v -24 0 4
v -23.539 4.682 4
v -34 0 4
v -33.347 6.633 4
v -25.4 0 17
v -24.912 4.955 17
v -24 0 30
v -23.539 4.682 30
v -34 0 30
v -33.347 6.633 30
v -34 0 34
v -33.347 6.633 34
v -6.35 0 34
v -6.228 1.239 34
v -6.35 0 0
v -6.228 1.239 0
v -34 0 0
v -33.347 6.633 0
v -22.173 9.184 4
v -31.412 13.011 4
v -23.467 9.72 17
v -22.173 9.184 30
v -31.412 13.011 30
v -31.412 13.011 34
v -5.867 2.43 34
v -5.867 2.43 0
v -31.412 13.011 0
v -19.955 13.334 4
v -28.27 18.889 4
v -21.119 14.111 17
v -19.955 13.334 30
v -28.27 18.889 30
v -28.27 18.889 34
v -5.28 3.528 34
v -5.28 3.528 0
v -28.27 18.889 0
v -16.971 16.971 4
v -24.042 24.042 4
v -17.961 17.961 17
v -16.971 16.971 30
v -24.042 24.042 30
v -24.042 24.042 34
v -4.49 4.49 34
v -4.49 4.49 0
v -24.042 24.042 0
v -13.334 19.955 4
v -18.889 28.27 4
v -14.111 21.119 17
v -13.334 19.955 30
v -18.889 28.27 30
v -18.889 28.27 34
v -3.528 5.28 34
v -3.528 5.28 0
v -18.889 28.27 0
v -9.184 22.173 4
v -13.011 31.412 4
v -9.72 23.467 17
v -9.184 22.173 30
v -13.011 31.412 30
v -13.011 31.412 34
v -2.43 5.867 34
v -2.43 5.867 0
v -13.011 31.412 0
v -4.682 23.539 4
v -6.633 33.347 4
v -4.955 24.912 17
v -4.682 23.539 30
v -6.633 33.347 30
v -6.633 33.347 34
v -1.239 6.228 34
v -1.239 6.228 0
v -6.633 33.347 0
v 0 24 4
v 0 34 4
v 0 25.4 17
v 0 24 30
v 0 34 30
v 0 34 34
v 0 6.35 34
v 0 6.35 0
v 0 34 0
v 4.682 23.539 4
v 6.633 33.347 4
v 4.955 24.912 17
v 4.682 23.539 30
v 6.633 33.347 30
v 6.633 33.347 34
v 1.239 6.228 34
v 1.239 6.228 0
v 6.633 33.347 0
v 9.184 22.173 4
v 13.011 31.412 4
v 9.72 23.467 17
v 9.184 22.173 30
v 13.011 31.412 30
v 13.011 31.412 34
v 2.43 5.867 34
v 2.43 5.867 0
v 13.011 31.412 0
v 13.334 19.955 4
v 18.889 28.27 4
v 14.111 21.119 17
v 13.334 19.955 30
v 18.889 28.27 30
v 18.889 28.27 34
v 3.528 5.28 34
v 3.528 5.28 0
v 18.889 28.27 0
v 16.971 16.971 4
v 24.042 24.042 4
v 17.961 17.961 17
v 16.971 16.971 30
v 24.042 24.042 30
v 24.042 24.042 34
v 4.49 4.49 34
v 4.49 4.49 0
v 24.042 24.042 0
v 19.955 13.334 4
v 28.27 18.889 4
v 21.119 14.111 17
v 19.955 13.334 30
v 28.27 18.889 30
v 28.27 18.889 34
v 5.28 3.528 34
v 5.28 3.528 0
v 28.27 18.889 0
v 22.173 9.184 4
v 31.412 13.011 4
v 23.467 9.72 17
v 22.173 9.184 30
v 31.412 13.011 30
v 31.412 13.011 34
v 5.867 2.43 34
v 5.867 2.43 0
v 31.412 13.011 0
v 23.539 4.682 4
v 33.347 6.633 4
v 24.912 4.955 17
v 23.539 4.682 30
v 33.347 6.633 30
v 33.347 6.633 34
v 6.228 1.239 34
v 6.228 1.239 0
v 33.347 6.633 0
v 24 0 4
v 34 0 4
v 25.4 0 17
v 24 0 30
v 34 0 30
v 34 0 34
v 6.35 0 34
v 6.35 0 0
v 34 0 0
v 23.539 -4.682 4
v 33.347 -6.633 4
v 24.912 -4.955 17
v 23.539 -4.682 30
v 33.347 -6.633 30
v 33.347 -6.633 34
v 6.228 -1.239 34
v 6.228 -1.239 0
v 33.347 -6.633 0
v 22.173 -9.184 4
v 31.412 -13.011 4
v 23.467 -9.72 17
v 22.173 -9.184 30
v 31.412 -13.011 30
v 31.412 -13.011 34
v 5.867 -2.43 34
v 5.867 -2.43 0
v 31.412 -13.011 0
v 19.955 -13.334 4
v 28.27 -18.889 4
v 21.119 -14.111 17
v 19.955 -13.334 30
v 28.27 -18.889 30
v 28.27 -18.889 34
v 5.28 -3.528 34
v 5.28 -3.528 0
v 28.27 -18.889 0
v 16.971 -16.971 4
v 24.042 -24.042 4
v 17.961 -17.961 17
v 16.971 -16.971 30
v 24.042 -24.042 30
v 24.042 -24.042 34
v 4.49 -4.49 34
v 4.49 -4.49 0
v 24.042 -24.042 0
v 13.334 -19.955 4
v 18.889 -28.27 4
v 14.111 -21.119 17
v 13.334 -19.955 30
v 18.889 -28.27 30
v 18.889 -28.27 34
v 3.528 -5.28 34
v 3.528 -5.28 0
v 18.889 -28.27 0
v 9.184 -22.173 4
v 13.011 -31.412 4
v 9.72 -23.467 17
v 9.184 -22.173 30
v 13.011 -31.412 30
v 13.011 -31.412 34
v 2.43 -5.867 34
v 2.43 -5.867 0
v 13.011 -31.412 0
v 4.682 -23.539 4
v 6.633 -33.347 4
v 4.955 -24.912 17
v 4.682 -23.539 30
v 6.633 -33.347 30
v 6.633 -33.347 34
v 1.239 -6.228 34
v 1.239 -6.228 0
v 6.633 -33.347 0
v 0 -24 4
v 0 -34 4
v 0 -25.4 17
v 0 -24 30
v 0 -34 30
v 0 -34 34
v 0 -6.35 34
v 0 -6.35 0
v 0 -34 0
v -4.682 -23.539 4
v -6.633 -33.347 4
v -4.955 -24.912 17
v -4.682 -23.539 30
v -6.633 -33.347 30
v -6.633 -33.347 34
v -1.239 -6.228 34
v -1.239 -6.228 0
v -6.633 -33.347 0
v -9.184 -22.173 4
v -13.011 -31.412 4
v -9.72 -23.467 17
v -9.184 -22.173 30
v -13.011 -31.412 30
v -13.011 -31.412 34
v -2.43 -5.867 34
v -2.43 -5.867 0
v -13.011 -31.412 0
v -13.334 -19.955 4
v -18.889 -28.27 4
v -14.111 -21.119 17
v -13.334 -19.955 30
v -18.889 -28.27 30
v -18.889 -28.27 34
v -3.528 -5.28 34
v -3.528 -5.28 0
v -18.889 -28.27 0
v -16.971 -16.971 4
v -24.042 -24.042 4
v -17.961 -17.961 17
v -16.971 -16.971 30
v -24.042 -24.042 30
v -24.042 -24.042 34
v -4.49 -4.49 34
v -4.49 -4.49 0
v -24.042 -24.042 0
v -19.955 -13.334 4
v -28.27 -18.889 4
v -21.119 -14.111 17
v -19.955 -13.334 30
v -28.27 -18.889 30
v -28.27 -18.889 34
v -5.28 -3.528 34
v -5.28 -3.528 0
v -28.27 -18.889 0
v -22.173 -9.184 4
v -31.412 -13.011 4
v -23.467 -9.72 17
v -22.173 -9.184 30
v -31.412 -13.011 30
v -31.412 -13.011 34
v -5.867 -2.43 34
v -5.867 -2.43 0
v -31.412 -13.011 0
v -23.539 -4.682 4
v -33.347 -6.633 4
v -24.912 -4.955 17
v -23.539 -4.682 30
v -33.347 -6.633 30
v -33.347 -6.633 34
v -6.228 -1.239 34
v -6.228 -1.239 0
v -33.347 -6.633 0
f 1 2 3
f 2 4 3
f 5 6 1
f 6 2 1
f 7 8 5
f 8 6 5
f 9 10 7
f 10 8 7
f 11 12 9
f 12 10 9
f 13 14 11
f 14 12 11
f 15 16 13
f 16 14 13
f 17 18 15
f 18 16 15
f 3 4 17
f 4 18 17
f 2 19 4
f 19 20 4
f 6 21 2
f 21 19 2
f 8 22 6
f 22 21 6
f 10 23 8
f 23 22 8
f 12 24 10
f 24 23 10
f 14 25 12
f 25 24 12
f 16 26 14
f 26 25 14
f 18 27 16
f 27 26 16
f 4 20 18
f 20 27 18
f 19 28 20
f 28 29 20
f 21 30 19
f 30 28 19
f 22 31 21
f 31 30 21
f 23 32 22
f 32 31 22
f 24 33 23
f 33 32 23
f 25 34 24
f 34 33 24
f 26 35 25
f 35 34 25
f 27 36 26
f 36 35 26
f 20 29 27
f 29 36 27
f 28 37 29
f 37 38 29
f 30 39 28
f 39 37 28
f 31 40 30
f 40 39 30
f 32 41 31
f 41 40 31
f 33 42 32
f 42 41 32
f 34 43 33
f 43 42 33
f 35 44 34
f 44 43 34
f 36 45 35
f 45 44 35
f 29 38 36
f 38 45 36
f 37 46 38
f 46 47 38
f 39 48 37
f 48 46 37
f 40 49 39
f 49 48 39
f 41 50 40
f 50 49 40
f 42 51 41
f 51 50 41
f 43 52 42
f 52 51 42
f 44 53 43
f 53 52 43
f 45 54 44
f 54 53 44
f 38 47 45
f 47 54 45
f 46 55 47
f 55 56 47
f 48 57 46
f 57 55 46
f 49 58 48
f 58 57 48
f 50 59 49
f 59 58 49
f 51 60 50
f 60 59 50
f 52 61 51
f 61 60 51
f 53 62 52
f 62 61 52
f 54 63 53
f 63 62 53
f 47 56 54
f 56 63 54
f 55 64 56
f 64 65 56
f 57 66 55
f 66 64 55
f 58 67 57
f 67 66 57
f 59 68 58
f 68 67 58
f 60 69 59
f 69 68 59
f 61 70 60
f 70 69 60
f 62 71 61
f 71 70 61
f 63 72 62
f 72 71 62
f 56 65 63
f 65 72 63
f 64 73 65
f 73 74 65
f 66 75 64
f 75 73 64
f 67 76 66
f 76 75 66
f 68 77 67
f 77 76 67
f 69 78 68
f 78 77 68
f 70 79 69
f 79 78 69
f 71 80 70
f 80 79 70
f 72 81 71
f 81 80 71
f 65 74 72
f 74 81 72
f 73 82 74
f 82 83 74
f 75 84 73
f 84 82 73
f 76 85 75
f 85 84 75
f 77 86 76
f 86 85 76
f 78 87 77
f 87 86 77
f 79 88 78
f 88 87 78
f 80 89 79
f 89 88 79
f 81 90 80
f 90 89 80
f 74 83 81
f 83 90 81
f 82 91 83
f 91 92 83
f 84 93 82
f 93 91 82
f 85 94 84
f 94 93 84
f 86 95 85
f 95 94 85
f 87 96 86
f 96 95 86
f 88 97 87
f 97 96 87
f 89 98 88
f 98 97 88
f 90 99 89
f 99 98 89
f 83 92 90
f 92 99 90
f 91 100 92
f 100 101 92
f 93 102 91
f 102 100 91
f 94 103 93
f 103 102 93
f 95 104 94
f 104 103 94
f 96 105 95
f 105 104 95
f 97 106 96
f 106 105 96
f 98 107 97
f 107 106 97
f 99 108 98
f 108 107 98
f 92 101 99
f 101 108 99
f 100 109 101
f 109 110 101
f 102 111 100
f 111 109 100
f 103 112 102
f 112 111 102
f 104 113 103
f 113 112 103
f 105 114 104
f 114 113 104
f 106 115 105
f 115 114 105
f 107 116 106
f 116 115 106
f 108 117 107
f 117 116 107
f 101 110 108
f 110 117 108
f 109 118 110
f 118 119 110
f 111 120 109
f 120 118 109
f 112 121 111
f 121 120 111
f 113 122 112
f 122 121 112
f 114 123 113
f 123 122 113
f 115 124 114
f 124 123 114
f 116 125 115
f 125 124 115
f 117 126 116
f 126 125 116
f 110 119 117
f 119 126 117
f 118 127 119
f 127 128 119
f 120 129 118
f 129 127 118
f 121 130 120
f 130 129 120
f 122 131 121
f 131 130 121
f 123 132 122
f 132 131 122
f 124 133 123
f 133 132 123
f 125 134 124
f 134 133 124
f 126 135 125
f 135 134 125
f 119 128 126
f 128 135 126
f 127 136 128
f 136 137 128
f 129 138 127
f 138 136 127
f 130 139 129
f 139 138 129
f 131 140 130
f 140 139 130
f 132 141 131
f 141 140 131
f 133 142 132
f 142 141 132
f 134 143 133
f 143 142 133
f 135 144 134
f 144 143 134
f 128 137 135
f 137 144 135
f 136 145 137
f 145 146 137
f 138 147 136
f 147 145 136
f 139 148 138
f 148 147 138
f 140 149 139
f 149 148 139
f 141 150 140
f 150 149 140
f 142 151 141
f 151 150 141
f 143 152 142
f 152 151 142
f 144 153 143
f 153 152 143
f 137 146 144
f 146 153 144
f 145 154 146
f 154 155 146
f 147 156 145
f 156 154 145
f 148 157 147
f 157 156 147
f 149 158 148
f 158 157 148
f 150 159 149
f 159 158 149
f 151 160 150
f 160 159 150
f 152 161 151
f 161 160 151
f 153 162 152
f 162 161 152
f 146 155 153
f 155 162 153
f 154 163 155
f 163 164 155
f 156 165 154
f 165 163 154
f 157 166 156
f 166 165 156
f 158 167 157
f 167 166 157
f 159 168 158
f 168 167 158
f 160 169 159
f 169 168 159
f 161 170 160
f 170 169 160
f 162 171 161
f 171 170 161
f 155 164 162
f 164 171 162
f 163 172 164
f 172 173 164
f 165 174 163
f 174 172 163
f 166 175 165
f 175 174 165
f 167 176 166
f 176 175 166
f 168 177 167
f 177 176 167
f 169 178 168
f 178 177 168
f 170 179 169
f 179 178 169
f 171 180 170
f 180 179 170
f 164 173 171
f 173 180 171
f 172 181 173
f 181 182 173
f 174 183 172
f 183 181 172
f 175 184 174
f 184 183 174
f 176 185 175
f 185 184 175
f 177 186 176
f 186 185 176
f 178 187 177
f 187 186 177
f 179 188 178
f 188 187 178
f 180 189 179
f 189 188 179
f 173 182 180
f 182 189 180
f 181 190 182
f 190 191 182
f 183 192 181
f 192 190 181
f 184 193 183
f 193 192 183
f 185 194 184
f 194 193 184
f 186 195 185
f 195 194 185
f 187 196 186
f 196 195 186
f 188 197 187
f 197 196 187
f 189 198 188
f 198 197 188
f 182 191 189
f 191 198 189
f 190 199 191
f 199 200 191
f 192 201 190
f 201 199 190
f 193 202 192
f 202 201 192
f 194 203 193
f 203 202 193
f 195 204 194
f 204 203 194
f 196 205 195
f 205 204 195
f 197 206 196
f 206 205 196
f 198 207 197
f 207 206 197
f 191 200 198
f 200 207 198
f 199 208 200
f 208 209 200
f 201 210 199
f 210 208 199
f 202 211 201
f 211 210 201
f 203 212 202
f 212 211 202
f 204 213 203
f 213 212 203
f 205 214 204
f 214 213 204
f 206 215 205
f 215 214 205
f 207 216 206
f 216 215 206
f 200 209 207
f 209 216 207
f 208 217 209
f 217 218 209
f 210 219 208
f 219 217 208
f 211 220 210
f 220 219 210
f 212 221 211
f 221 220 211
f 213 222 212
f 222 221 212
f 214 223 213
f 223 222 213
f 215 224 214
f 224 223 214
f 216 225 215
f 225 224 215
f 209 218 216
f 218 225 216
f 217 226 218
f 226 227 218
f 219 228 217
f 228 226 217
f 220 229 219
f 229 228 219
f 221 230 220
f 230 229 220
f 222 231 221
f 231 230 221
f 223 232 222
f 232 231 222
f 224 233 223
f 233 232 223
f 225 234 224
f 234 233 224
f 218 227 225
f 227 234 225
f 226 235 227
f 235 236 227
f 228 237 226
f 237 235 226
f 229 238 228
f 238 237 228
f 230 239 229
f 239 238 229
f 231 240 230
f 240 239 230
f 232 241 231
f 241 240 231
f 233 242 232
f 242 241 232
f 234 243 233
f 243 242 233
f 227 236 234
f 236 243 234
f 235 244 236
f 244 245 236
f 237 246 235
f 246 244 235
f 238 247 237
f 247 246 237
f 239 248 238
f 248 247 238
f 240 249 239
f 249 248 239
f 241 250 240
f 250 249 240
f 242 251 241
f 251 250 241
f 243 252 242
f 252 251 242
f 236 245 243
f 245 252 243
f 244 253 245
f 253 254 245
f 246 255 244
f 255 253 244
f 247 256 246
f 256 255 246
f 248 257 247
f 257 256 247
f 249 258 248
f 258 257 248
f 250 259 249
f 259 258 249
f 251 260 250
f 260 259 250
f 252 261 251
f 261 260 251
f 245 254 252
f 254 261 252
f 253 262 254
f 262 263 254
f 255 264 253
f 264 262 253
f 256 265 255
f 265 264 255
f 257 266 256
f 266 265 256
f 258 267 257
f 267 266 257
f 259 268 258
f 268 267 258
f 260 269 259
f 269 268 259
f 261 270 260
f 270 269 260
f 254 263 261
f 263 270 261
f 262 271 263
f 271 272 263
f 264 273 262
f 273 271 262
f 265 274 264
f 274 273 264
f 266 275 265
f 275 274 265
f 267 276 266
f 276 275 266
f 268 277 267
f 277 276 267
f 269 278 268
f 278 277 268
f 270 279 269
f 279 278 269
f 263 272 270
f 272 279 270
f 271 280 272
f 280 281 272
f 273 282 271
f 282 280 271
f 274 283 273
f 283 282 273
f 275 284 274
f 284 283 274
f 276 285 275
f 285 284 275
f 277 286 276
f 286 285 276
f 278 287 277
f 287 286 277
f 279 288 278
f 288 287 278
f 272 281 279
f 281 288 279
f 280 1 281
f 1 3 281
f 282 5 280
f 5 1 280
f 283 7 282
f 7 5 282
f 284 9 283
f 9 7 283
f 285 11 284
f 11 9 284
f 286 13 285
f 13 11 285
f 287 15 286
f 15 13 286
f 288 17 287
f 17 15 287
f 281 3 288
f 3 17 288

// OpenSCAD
$fn = 32;

// ----------------------------------------------------------------------
// Belt roller: 48 mm barrel, 34 mm wide, bore 12.7 mm
// ----------------------------------------------------------------------

// --- parameters (mm) ---
bore_d = 12.7;            // bore
barrel_d = 48;            // barrel diameter
roller_w = 34;            // roller width
flange_d = 68;            // flange diameter
flange_t = 4;             // flange thickness
hub_d = 36.7;             // hub diameter

roller_profile = [[6.35, 0], [34, 0], [34, 4], [24, 4], [25.4, 17], [24, 30], [34, 30], [34, 34], [6.35, 34]];

/* the profile stays clear of the axis, so the bore comes out of the revolve */
rotate_extrude() polygon(roller_profile);
